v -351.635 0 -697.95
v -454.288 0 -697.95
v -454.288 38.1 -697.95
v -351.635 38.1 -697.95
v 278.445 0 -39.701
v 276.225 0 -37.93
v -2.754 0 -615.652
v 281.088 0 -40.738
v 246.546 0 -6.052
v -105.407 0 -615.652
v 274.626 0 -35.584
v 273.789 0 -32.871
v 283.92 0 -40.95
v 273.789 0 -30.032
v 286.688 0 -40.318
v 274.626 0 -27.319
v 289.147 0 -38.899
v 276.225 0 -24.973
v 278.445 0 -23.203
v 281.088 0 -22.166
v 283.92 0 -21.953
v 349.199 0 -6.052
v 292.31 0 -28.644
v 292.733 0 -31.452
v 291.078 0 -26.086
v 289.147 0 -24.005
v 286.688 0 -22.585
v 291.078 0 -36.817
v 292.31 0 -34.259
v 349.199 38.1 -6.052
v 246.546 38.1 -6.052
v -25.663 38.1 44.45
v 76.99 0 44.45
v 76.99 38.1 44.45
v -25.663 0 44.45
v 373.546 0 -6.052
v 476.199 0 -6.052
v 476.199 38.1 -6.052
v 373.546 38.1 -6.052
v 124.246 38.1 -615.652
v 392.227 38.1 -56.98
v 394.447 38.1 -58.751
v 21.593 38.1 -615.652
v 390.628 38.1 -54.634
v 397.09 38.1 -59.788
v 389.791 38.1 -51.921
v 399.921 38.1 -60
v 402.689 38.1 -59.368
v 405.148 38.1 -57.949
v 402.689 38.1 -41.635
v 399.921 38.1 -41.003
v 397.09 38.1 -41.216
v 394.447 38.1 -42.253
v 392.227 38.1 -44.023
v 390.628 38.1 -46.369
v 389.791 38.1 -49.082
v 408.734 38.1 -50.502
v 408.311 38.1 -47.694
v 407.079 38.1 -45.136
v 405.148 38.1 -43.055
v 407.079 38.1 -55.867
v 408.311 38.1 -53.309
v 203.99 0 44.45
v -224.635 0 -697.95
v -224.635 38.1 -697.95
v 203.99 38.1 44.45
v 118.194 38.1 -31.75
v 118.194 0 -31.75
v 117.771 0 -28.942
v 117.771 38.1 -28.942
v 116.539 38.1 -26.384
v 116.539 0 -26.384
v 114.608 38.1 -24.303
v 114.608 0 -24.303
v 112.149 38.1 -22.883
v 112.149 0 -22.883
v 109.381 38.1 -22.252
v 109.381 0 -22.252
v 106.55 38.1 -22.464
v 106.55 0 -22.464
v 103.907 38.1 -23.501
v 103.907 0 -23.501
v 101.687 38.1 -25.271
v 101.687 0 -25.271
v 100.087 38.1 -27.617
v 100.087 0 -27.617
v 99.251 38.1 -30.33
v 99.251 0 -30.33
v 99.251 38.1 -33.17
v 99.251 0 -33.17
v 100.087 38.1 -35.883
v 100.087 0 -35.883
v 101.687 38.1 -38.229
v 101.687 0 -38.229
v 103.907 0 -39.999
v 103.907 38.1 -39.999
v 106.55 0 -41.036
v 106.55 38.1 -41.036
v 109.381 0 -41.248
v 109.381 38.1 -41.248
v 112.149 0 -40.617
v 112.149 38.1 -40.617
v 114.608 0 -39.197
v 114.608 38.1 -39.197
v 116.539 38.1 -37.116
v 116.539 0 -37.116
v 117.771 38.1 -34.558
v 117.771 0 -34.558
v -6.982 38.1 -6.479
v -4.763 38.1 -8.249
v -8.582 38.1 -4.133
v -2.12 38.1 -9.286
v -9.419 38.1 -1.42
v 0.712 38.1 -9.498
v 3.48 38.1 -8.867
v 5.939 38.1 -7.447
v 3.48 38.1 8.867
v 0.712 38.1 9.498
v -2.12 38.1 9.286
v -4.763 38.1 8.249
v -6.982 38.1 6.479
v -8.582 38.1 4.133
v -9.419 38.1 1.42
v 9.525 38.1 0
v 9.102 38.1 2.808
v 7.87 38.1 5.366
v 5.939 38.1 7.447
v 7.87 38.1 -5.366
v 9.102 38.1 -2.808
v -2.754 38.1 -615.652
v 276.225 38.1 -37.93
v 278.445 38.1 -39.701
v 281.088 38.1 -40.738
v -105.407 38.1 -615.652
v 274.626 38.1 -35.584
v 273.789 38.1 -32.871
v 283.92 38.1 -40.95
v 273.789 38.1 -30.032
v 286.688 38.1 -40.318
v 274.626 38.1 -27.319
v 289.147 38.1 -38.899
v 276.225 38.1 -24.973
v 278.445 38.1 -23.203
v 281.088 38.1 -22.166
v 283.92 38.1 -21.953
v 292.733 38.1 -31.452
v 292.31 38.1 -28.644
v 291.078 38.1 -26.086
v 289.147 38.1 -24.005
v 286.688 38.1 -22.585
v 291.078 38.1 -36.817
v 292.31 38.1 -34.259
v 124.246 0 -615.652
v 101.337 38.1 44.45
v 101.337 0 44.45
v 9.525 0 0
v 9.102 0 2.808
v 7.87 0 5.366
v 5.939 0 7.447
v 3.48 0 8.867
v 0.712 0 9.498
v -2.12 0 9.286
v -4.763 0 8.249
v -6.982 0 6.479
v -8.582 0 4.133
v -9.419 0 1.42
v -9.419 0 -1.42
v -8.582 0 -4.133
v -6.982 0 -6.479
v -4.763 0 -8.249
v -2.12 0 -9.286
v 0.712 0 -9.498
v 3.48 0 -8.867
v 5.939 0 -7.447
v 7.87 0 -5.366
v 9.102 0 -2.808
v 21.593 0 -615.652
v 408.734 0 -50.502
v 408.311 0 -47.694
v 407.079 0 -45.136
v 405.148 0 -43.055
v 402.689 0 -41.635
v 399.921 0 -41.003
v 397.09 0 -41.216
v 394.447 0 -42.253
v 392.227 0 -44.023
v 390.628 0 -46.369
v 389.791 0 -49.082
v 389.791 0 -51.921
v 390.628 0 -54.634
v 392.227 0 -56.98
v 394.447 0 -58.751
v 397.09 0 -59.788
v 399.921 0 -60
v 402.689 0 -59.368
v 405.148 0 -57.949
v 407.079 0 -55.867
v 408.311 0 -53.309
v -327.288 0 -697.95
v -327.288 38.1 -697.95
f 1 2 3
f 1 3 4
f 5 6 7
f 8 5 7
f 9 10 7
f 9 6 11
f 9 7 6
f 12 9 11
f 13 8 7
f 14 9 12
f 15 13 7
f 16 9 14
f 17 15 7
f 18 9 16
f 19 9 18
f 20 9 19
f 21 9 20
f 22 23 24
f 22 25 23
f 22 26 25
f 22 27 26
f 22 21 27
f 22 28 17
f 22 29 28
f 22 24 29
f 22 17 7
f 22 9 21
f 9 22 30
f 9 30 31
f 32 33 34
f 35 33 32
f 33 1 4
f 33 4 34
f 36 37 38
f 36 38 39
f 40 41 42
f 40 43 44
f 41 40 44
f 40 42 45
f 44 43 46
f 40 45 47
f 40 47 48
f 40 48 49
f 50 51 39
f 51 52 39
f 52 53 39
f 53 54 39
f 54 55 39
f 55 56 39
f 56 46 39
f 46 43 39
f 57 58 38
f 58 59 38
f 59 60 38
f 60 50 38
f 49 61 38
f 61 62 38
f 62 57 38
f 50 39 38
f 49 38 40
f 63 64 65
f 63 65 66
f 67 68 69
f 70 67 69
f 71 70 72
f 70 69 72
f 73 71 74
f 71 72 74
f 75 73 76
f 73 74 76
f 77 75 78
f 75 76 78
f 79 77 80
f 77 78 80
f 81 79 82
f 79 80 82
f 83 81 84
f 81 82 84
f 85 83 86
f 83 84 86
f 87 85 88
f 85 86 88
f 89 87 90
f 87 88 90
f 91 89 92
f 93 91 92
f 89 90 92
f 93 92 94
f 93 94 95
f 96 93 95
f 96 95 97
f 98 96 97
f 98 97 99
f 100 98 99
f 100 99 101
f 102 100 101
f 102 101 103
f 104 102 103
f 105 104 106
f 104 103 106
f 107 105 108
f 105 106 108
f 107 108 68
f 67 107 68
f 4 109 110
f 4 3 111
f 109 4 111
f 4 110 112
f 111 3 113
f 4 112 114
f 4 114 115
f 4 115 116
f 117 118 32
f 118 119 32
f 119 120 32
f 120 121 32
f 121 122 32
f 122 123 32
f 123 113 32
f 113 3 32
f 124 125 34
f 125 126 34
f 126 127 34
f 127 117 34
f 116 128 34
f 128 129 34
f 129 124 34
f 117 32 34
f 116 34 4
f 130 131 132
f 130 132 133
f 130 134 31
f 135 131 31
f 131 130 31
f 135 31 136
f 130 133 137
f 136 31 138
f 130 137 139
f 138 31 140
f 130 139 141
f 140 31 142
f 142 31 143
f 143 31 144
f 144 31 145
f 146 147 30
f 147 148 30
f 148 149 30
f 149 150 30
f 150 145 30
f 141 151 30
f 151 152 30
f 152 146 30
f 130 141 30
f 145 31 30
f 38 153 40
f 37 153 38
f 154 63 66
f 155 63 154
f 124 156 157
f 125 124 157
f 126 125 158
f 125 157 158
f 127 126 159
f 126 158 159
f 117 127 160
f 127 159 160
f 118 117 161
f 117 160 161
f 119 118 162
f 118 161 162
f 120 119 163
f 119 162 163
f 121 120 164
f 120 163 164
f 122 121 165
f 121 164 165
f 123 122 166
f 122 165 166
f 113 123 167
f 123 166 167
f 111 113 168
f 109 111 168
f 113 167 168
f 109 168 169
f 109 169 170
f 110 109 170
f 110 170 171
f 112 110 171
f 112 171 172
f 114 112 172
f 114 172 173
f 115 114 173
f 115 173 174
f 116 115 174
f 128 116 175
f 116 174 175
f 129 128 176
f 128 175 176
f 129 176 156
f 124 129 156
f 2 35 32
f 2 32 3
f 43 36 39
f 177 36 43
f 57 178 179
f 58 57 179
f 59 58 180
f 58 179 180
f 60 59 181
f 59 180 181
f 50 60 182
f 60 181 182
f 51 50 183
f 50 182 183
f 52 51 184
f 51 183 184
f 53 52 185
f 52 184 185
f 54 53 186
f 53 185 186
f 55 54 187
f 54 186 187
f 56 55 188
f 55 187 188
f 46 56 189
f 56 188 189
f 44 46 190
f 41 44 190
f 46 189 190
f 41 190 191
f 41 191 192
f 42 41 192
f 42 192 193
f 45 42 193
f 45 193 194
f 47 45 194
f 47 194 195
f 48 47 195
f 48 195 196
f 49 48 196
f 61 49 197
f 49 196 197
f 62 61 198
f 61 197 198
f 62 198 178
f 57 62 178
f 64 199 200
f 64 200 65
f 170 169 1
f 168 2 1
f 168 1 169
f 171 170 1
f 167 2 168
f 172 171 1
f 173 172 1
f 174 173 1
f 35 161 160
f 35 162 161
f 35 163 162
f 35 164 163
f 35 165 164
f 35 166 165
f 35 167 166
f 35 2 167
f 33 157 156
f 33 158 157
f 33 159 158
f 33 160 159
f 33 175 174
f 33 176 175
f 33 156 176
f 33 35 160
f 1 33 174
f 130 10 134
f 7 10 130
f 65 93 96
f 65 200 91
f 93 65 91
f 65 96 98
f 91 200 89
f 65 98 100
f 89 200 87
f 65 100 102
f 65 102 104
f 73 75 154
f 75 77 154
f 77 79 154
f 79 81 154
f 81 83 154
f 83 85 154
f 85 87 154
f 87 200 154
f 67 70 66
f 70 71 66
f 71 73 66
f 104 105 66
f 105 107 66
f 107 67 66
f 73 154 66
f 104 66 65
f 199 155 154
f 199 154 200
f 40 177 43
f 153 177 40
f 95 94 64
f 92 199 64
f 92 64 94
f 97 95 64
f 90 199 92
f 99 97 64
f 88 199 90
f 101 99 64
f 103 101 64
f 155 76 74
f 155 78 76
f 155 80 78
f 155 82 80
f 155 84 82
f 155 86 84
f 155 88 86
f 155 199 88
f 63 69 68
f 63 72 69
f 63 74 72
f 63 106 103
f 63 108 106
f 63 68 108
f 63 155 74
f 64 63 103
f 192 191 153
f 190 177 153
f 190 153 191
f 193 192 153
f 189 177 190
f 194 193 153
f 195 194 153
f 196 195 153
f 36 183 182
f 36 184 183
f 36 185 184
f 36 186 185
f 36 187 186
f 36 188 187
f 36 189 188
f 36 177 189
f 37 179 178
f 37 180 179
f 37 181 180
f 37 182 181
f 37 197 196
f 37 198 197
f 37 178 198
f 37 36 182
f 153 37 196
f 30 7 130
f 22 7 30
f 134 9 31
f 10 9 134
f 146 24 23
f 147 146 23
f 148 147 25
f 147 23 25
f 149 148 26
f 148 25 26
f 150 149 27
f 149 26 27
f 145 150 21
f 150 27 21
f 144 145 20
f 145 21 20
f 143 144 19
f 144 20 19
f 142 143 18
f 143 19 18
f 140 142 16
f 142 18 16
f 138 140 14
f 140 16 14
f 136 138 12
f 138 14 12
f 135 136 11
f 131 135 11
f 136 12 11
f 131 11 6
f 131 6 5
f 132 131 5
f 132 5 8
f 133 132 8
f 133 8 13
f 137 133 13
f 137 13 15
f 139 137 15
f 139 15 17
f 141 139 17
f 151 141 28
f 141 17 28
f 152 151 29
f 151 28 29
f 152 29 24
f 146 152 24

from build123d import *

# Parameters (mm, degrees)
F0_R      = 9.525
F1_DEPTH  = 38.1
F3_DEPTH  = 38.1
F4_R      = 9.525
F5_DEPTH  = 38.1
F6_R      = 9.525
F7_DEPTH  = 38.1
F9_DEPTH  = 38.1
F10_R     = 9.525
F11_DEPTH = 38.1


with BuildPart() as f1:
    # F0 (on Front) → F1 (new body)
    with BuildSketch(Plane.XZ):
        Polygon((-25.6632194655, 44.45), (-454.2882194655, -697.9502773942), (-351.6353416036, -697.9502773942), (76.9896583964, 44.45), align=None)
        Circle(F0_R, mode=Mode.SUBTRACT)
        Circle(F0_R)
    extrude(amount=-F1_DEPTH)


with BuildPart() as f2_1:
    # F2: copy of F1
    add(f1.part.moved(Location((127, 0, 0))))

    # F4 (on face) → F5 (cut)
    with BuildSketch(Plane.XZ):
        with Locations((108.6691289532, -31.75)):
            Circle(F4_R)
    extrude(amount=-F5_DEPTH, mode=Mode.SUBTRACT)


with BuildPart() as f1_1:
    add(f1.part)

    # F0 (on Front) → F3 (cut, through all)
    with BuildSketch(Plane.XZ):
        Circle(F0_R)
    extrude(amount=-F3_DEPTH, mode=Mode.SUBTRACT)


with BuildPart() as f7:
    # F6 (on Front) → F7 (new body)
    with BuildSketch(Plane.XZ):
        Polygon((246.5460331716, -6.0517536146), (-105.4066909264, -615.6517536146), (-2.7538130645, -615.6517536146), (349.1989110335, -6.0517536146), align=None)
        with Locations((283.2077752651, -31.4517536146)):
            Circle(F6_R, mode=Mode.SUBTRACT)
        with Locations((283.2077752651, -31.4517536146)):
            Circle(F6_R)
    extrude(amount=-F7_DEPTH)


with BuildPart() as f8_1:
    # F8: copy of F7
    add(f7.part.moved(Location((127, 0, 0))))

    # F10 (on face) → F11 (cut)
    with BuildSketch(Plane.XZ):
        with Locations((399.2092526371, -50.5017536146)):
            Circle(F10_R)
    extrude(amount=-F11_DEPTH, mode=Mode.SUBTRACT)


with BuildPart() as f7_1:
    add(f7.part)

    # F6 (on Front) → F9 (cut)
    with BuildSketch(Plane.XZ):
        with Locations((283.2077752651, -31.4517536146)):
            Circle(F6_R)
    extrude(amount=-F9_DEPTH, mode=Mode.SUBTRACT)


solid = Compound([f2_1.part, f1_1.part, f8_1.part, f7_1.part])
